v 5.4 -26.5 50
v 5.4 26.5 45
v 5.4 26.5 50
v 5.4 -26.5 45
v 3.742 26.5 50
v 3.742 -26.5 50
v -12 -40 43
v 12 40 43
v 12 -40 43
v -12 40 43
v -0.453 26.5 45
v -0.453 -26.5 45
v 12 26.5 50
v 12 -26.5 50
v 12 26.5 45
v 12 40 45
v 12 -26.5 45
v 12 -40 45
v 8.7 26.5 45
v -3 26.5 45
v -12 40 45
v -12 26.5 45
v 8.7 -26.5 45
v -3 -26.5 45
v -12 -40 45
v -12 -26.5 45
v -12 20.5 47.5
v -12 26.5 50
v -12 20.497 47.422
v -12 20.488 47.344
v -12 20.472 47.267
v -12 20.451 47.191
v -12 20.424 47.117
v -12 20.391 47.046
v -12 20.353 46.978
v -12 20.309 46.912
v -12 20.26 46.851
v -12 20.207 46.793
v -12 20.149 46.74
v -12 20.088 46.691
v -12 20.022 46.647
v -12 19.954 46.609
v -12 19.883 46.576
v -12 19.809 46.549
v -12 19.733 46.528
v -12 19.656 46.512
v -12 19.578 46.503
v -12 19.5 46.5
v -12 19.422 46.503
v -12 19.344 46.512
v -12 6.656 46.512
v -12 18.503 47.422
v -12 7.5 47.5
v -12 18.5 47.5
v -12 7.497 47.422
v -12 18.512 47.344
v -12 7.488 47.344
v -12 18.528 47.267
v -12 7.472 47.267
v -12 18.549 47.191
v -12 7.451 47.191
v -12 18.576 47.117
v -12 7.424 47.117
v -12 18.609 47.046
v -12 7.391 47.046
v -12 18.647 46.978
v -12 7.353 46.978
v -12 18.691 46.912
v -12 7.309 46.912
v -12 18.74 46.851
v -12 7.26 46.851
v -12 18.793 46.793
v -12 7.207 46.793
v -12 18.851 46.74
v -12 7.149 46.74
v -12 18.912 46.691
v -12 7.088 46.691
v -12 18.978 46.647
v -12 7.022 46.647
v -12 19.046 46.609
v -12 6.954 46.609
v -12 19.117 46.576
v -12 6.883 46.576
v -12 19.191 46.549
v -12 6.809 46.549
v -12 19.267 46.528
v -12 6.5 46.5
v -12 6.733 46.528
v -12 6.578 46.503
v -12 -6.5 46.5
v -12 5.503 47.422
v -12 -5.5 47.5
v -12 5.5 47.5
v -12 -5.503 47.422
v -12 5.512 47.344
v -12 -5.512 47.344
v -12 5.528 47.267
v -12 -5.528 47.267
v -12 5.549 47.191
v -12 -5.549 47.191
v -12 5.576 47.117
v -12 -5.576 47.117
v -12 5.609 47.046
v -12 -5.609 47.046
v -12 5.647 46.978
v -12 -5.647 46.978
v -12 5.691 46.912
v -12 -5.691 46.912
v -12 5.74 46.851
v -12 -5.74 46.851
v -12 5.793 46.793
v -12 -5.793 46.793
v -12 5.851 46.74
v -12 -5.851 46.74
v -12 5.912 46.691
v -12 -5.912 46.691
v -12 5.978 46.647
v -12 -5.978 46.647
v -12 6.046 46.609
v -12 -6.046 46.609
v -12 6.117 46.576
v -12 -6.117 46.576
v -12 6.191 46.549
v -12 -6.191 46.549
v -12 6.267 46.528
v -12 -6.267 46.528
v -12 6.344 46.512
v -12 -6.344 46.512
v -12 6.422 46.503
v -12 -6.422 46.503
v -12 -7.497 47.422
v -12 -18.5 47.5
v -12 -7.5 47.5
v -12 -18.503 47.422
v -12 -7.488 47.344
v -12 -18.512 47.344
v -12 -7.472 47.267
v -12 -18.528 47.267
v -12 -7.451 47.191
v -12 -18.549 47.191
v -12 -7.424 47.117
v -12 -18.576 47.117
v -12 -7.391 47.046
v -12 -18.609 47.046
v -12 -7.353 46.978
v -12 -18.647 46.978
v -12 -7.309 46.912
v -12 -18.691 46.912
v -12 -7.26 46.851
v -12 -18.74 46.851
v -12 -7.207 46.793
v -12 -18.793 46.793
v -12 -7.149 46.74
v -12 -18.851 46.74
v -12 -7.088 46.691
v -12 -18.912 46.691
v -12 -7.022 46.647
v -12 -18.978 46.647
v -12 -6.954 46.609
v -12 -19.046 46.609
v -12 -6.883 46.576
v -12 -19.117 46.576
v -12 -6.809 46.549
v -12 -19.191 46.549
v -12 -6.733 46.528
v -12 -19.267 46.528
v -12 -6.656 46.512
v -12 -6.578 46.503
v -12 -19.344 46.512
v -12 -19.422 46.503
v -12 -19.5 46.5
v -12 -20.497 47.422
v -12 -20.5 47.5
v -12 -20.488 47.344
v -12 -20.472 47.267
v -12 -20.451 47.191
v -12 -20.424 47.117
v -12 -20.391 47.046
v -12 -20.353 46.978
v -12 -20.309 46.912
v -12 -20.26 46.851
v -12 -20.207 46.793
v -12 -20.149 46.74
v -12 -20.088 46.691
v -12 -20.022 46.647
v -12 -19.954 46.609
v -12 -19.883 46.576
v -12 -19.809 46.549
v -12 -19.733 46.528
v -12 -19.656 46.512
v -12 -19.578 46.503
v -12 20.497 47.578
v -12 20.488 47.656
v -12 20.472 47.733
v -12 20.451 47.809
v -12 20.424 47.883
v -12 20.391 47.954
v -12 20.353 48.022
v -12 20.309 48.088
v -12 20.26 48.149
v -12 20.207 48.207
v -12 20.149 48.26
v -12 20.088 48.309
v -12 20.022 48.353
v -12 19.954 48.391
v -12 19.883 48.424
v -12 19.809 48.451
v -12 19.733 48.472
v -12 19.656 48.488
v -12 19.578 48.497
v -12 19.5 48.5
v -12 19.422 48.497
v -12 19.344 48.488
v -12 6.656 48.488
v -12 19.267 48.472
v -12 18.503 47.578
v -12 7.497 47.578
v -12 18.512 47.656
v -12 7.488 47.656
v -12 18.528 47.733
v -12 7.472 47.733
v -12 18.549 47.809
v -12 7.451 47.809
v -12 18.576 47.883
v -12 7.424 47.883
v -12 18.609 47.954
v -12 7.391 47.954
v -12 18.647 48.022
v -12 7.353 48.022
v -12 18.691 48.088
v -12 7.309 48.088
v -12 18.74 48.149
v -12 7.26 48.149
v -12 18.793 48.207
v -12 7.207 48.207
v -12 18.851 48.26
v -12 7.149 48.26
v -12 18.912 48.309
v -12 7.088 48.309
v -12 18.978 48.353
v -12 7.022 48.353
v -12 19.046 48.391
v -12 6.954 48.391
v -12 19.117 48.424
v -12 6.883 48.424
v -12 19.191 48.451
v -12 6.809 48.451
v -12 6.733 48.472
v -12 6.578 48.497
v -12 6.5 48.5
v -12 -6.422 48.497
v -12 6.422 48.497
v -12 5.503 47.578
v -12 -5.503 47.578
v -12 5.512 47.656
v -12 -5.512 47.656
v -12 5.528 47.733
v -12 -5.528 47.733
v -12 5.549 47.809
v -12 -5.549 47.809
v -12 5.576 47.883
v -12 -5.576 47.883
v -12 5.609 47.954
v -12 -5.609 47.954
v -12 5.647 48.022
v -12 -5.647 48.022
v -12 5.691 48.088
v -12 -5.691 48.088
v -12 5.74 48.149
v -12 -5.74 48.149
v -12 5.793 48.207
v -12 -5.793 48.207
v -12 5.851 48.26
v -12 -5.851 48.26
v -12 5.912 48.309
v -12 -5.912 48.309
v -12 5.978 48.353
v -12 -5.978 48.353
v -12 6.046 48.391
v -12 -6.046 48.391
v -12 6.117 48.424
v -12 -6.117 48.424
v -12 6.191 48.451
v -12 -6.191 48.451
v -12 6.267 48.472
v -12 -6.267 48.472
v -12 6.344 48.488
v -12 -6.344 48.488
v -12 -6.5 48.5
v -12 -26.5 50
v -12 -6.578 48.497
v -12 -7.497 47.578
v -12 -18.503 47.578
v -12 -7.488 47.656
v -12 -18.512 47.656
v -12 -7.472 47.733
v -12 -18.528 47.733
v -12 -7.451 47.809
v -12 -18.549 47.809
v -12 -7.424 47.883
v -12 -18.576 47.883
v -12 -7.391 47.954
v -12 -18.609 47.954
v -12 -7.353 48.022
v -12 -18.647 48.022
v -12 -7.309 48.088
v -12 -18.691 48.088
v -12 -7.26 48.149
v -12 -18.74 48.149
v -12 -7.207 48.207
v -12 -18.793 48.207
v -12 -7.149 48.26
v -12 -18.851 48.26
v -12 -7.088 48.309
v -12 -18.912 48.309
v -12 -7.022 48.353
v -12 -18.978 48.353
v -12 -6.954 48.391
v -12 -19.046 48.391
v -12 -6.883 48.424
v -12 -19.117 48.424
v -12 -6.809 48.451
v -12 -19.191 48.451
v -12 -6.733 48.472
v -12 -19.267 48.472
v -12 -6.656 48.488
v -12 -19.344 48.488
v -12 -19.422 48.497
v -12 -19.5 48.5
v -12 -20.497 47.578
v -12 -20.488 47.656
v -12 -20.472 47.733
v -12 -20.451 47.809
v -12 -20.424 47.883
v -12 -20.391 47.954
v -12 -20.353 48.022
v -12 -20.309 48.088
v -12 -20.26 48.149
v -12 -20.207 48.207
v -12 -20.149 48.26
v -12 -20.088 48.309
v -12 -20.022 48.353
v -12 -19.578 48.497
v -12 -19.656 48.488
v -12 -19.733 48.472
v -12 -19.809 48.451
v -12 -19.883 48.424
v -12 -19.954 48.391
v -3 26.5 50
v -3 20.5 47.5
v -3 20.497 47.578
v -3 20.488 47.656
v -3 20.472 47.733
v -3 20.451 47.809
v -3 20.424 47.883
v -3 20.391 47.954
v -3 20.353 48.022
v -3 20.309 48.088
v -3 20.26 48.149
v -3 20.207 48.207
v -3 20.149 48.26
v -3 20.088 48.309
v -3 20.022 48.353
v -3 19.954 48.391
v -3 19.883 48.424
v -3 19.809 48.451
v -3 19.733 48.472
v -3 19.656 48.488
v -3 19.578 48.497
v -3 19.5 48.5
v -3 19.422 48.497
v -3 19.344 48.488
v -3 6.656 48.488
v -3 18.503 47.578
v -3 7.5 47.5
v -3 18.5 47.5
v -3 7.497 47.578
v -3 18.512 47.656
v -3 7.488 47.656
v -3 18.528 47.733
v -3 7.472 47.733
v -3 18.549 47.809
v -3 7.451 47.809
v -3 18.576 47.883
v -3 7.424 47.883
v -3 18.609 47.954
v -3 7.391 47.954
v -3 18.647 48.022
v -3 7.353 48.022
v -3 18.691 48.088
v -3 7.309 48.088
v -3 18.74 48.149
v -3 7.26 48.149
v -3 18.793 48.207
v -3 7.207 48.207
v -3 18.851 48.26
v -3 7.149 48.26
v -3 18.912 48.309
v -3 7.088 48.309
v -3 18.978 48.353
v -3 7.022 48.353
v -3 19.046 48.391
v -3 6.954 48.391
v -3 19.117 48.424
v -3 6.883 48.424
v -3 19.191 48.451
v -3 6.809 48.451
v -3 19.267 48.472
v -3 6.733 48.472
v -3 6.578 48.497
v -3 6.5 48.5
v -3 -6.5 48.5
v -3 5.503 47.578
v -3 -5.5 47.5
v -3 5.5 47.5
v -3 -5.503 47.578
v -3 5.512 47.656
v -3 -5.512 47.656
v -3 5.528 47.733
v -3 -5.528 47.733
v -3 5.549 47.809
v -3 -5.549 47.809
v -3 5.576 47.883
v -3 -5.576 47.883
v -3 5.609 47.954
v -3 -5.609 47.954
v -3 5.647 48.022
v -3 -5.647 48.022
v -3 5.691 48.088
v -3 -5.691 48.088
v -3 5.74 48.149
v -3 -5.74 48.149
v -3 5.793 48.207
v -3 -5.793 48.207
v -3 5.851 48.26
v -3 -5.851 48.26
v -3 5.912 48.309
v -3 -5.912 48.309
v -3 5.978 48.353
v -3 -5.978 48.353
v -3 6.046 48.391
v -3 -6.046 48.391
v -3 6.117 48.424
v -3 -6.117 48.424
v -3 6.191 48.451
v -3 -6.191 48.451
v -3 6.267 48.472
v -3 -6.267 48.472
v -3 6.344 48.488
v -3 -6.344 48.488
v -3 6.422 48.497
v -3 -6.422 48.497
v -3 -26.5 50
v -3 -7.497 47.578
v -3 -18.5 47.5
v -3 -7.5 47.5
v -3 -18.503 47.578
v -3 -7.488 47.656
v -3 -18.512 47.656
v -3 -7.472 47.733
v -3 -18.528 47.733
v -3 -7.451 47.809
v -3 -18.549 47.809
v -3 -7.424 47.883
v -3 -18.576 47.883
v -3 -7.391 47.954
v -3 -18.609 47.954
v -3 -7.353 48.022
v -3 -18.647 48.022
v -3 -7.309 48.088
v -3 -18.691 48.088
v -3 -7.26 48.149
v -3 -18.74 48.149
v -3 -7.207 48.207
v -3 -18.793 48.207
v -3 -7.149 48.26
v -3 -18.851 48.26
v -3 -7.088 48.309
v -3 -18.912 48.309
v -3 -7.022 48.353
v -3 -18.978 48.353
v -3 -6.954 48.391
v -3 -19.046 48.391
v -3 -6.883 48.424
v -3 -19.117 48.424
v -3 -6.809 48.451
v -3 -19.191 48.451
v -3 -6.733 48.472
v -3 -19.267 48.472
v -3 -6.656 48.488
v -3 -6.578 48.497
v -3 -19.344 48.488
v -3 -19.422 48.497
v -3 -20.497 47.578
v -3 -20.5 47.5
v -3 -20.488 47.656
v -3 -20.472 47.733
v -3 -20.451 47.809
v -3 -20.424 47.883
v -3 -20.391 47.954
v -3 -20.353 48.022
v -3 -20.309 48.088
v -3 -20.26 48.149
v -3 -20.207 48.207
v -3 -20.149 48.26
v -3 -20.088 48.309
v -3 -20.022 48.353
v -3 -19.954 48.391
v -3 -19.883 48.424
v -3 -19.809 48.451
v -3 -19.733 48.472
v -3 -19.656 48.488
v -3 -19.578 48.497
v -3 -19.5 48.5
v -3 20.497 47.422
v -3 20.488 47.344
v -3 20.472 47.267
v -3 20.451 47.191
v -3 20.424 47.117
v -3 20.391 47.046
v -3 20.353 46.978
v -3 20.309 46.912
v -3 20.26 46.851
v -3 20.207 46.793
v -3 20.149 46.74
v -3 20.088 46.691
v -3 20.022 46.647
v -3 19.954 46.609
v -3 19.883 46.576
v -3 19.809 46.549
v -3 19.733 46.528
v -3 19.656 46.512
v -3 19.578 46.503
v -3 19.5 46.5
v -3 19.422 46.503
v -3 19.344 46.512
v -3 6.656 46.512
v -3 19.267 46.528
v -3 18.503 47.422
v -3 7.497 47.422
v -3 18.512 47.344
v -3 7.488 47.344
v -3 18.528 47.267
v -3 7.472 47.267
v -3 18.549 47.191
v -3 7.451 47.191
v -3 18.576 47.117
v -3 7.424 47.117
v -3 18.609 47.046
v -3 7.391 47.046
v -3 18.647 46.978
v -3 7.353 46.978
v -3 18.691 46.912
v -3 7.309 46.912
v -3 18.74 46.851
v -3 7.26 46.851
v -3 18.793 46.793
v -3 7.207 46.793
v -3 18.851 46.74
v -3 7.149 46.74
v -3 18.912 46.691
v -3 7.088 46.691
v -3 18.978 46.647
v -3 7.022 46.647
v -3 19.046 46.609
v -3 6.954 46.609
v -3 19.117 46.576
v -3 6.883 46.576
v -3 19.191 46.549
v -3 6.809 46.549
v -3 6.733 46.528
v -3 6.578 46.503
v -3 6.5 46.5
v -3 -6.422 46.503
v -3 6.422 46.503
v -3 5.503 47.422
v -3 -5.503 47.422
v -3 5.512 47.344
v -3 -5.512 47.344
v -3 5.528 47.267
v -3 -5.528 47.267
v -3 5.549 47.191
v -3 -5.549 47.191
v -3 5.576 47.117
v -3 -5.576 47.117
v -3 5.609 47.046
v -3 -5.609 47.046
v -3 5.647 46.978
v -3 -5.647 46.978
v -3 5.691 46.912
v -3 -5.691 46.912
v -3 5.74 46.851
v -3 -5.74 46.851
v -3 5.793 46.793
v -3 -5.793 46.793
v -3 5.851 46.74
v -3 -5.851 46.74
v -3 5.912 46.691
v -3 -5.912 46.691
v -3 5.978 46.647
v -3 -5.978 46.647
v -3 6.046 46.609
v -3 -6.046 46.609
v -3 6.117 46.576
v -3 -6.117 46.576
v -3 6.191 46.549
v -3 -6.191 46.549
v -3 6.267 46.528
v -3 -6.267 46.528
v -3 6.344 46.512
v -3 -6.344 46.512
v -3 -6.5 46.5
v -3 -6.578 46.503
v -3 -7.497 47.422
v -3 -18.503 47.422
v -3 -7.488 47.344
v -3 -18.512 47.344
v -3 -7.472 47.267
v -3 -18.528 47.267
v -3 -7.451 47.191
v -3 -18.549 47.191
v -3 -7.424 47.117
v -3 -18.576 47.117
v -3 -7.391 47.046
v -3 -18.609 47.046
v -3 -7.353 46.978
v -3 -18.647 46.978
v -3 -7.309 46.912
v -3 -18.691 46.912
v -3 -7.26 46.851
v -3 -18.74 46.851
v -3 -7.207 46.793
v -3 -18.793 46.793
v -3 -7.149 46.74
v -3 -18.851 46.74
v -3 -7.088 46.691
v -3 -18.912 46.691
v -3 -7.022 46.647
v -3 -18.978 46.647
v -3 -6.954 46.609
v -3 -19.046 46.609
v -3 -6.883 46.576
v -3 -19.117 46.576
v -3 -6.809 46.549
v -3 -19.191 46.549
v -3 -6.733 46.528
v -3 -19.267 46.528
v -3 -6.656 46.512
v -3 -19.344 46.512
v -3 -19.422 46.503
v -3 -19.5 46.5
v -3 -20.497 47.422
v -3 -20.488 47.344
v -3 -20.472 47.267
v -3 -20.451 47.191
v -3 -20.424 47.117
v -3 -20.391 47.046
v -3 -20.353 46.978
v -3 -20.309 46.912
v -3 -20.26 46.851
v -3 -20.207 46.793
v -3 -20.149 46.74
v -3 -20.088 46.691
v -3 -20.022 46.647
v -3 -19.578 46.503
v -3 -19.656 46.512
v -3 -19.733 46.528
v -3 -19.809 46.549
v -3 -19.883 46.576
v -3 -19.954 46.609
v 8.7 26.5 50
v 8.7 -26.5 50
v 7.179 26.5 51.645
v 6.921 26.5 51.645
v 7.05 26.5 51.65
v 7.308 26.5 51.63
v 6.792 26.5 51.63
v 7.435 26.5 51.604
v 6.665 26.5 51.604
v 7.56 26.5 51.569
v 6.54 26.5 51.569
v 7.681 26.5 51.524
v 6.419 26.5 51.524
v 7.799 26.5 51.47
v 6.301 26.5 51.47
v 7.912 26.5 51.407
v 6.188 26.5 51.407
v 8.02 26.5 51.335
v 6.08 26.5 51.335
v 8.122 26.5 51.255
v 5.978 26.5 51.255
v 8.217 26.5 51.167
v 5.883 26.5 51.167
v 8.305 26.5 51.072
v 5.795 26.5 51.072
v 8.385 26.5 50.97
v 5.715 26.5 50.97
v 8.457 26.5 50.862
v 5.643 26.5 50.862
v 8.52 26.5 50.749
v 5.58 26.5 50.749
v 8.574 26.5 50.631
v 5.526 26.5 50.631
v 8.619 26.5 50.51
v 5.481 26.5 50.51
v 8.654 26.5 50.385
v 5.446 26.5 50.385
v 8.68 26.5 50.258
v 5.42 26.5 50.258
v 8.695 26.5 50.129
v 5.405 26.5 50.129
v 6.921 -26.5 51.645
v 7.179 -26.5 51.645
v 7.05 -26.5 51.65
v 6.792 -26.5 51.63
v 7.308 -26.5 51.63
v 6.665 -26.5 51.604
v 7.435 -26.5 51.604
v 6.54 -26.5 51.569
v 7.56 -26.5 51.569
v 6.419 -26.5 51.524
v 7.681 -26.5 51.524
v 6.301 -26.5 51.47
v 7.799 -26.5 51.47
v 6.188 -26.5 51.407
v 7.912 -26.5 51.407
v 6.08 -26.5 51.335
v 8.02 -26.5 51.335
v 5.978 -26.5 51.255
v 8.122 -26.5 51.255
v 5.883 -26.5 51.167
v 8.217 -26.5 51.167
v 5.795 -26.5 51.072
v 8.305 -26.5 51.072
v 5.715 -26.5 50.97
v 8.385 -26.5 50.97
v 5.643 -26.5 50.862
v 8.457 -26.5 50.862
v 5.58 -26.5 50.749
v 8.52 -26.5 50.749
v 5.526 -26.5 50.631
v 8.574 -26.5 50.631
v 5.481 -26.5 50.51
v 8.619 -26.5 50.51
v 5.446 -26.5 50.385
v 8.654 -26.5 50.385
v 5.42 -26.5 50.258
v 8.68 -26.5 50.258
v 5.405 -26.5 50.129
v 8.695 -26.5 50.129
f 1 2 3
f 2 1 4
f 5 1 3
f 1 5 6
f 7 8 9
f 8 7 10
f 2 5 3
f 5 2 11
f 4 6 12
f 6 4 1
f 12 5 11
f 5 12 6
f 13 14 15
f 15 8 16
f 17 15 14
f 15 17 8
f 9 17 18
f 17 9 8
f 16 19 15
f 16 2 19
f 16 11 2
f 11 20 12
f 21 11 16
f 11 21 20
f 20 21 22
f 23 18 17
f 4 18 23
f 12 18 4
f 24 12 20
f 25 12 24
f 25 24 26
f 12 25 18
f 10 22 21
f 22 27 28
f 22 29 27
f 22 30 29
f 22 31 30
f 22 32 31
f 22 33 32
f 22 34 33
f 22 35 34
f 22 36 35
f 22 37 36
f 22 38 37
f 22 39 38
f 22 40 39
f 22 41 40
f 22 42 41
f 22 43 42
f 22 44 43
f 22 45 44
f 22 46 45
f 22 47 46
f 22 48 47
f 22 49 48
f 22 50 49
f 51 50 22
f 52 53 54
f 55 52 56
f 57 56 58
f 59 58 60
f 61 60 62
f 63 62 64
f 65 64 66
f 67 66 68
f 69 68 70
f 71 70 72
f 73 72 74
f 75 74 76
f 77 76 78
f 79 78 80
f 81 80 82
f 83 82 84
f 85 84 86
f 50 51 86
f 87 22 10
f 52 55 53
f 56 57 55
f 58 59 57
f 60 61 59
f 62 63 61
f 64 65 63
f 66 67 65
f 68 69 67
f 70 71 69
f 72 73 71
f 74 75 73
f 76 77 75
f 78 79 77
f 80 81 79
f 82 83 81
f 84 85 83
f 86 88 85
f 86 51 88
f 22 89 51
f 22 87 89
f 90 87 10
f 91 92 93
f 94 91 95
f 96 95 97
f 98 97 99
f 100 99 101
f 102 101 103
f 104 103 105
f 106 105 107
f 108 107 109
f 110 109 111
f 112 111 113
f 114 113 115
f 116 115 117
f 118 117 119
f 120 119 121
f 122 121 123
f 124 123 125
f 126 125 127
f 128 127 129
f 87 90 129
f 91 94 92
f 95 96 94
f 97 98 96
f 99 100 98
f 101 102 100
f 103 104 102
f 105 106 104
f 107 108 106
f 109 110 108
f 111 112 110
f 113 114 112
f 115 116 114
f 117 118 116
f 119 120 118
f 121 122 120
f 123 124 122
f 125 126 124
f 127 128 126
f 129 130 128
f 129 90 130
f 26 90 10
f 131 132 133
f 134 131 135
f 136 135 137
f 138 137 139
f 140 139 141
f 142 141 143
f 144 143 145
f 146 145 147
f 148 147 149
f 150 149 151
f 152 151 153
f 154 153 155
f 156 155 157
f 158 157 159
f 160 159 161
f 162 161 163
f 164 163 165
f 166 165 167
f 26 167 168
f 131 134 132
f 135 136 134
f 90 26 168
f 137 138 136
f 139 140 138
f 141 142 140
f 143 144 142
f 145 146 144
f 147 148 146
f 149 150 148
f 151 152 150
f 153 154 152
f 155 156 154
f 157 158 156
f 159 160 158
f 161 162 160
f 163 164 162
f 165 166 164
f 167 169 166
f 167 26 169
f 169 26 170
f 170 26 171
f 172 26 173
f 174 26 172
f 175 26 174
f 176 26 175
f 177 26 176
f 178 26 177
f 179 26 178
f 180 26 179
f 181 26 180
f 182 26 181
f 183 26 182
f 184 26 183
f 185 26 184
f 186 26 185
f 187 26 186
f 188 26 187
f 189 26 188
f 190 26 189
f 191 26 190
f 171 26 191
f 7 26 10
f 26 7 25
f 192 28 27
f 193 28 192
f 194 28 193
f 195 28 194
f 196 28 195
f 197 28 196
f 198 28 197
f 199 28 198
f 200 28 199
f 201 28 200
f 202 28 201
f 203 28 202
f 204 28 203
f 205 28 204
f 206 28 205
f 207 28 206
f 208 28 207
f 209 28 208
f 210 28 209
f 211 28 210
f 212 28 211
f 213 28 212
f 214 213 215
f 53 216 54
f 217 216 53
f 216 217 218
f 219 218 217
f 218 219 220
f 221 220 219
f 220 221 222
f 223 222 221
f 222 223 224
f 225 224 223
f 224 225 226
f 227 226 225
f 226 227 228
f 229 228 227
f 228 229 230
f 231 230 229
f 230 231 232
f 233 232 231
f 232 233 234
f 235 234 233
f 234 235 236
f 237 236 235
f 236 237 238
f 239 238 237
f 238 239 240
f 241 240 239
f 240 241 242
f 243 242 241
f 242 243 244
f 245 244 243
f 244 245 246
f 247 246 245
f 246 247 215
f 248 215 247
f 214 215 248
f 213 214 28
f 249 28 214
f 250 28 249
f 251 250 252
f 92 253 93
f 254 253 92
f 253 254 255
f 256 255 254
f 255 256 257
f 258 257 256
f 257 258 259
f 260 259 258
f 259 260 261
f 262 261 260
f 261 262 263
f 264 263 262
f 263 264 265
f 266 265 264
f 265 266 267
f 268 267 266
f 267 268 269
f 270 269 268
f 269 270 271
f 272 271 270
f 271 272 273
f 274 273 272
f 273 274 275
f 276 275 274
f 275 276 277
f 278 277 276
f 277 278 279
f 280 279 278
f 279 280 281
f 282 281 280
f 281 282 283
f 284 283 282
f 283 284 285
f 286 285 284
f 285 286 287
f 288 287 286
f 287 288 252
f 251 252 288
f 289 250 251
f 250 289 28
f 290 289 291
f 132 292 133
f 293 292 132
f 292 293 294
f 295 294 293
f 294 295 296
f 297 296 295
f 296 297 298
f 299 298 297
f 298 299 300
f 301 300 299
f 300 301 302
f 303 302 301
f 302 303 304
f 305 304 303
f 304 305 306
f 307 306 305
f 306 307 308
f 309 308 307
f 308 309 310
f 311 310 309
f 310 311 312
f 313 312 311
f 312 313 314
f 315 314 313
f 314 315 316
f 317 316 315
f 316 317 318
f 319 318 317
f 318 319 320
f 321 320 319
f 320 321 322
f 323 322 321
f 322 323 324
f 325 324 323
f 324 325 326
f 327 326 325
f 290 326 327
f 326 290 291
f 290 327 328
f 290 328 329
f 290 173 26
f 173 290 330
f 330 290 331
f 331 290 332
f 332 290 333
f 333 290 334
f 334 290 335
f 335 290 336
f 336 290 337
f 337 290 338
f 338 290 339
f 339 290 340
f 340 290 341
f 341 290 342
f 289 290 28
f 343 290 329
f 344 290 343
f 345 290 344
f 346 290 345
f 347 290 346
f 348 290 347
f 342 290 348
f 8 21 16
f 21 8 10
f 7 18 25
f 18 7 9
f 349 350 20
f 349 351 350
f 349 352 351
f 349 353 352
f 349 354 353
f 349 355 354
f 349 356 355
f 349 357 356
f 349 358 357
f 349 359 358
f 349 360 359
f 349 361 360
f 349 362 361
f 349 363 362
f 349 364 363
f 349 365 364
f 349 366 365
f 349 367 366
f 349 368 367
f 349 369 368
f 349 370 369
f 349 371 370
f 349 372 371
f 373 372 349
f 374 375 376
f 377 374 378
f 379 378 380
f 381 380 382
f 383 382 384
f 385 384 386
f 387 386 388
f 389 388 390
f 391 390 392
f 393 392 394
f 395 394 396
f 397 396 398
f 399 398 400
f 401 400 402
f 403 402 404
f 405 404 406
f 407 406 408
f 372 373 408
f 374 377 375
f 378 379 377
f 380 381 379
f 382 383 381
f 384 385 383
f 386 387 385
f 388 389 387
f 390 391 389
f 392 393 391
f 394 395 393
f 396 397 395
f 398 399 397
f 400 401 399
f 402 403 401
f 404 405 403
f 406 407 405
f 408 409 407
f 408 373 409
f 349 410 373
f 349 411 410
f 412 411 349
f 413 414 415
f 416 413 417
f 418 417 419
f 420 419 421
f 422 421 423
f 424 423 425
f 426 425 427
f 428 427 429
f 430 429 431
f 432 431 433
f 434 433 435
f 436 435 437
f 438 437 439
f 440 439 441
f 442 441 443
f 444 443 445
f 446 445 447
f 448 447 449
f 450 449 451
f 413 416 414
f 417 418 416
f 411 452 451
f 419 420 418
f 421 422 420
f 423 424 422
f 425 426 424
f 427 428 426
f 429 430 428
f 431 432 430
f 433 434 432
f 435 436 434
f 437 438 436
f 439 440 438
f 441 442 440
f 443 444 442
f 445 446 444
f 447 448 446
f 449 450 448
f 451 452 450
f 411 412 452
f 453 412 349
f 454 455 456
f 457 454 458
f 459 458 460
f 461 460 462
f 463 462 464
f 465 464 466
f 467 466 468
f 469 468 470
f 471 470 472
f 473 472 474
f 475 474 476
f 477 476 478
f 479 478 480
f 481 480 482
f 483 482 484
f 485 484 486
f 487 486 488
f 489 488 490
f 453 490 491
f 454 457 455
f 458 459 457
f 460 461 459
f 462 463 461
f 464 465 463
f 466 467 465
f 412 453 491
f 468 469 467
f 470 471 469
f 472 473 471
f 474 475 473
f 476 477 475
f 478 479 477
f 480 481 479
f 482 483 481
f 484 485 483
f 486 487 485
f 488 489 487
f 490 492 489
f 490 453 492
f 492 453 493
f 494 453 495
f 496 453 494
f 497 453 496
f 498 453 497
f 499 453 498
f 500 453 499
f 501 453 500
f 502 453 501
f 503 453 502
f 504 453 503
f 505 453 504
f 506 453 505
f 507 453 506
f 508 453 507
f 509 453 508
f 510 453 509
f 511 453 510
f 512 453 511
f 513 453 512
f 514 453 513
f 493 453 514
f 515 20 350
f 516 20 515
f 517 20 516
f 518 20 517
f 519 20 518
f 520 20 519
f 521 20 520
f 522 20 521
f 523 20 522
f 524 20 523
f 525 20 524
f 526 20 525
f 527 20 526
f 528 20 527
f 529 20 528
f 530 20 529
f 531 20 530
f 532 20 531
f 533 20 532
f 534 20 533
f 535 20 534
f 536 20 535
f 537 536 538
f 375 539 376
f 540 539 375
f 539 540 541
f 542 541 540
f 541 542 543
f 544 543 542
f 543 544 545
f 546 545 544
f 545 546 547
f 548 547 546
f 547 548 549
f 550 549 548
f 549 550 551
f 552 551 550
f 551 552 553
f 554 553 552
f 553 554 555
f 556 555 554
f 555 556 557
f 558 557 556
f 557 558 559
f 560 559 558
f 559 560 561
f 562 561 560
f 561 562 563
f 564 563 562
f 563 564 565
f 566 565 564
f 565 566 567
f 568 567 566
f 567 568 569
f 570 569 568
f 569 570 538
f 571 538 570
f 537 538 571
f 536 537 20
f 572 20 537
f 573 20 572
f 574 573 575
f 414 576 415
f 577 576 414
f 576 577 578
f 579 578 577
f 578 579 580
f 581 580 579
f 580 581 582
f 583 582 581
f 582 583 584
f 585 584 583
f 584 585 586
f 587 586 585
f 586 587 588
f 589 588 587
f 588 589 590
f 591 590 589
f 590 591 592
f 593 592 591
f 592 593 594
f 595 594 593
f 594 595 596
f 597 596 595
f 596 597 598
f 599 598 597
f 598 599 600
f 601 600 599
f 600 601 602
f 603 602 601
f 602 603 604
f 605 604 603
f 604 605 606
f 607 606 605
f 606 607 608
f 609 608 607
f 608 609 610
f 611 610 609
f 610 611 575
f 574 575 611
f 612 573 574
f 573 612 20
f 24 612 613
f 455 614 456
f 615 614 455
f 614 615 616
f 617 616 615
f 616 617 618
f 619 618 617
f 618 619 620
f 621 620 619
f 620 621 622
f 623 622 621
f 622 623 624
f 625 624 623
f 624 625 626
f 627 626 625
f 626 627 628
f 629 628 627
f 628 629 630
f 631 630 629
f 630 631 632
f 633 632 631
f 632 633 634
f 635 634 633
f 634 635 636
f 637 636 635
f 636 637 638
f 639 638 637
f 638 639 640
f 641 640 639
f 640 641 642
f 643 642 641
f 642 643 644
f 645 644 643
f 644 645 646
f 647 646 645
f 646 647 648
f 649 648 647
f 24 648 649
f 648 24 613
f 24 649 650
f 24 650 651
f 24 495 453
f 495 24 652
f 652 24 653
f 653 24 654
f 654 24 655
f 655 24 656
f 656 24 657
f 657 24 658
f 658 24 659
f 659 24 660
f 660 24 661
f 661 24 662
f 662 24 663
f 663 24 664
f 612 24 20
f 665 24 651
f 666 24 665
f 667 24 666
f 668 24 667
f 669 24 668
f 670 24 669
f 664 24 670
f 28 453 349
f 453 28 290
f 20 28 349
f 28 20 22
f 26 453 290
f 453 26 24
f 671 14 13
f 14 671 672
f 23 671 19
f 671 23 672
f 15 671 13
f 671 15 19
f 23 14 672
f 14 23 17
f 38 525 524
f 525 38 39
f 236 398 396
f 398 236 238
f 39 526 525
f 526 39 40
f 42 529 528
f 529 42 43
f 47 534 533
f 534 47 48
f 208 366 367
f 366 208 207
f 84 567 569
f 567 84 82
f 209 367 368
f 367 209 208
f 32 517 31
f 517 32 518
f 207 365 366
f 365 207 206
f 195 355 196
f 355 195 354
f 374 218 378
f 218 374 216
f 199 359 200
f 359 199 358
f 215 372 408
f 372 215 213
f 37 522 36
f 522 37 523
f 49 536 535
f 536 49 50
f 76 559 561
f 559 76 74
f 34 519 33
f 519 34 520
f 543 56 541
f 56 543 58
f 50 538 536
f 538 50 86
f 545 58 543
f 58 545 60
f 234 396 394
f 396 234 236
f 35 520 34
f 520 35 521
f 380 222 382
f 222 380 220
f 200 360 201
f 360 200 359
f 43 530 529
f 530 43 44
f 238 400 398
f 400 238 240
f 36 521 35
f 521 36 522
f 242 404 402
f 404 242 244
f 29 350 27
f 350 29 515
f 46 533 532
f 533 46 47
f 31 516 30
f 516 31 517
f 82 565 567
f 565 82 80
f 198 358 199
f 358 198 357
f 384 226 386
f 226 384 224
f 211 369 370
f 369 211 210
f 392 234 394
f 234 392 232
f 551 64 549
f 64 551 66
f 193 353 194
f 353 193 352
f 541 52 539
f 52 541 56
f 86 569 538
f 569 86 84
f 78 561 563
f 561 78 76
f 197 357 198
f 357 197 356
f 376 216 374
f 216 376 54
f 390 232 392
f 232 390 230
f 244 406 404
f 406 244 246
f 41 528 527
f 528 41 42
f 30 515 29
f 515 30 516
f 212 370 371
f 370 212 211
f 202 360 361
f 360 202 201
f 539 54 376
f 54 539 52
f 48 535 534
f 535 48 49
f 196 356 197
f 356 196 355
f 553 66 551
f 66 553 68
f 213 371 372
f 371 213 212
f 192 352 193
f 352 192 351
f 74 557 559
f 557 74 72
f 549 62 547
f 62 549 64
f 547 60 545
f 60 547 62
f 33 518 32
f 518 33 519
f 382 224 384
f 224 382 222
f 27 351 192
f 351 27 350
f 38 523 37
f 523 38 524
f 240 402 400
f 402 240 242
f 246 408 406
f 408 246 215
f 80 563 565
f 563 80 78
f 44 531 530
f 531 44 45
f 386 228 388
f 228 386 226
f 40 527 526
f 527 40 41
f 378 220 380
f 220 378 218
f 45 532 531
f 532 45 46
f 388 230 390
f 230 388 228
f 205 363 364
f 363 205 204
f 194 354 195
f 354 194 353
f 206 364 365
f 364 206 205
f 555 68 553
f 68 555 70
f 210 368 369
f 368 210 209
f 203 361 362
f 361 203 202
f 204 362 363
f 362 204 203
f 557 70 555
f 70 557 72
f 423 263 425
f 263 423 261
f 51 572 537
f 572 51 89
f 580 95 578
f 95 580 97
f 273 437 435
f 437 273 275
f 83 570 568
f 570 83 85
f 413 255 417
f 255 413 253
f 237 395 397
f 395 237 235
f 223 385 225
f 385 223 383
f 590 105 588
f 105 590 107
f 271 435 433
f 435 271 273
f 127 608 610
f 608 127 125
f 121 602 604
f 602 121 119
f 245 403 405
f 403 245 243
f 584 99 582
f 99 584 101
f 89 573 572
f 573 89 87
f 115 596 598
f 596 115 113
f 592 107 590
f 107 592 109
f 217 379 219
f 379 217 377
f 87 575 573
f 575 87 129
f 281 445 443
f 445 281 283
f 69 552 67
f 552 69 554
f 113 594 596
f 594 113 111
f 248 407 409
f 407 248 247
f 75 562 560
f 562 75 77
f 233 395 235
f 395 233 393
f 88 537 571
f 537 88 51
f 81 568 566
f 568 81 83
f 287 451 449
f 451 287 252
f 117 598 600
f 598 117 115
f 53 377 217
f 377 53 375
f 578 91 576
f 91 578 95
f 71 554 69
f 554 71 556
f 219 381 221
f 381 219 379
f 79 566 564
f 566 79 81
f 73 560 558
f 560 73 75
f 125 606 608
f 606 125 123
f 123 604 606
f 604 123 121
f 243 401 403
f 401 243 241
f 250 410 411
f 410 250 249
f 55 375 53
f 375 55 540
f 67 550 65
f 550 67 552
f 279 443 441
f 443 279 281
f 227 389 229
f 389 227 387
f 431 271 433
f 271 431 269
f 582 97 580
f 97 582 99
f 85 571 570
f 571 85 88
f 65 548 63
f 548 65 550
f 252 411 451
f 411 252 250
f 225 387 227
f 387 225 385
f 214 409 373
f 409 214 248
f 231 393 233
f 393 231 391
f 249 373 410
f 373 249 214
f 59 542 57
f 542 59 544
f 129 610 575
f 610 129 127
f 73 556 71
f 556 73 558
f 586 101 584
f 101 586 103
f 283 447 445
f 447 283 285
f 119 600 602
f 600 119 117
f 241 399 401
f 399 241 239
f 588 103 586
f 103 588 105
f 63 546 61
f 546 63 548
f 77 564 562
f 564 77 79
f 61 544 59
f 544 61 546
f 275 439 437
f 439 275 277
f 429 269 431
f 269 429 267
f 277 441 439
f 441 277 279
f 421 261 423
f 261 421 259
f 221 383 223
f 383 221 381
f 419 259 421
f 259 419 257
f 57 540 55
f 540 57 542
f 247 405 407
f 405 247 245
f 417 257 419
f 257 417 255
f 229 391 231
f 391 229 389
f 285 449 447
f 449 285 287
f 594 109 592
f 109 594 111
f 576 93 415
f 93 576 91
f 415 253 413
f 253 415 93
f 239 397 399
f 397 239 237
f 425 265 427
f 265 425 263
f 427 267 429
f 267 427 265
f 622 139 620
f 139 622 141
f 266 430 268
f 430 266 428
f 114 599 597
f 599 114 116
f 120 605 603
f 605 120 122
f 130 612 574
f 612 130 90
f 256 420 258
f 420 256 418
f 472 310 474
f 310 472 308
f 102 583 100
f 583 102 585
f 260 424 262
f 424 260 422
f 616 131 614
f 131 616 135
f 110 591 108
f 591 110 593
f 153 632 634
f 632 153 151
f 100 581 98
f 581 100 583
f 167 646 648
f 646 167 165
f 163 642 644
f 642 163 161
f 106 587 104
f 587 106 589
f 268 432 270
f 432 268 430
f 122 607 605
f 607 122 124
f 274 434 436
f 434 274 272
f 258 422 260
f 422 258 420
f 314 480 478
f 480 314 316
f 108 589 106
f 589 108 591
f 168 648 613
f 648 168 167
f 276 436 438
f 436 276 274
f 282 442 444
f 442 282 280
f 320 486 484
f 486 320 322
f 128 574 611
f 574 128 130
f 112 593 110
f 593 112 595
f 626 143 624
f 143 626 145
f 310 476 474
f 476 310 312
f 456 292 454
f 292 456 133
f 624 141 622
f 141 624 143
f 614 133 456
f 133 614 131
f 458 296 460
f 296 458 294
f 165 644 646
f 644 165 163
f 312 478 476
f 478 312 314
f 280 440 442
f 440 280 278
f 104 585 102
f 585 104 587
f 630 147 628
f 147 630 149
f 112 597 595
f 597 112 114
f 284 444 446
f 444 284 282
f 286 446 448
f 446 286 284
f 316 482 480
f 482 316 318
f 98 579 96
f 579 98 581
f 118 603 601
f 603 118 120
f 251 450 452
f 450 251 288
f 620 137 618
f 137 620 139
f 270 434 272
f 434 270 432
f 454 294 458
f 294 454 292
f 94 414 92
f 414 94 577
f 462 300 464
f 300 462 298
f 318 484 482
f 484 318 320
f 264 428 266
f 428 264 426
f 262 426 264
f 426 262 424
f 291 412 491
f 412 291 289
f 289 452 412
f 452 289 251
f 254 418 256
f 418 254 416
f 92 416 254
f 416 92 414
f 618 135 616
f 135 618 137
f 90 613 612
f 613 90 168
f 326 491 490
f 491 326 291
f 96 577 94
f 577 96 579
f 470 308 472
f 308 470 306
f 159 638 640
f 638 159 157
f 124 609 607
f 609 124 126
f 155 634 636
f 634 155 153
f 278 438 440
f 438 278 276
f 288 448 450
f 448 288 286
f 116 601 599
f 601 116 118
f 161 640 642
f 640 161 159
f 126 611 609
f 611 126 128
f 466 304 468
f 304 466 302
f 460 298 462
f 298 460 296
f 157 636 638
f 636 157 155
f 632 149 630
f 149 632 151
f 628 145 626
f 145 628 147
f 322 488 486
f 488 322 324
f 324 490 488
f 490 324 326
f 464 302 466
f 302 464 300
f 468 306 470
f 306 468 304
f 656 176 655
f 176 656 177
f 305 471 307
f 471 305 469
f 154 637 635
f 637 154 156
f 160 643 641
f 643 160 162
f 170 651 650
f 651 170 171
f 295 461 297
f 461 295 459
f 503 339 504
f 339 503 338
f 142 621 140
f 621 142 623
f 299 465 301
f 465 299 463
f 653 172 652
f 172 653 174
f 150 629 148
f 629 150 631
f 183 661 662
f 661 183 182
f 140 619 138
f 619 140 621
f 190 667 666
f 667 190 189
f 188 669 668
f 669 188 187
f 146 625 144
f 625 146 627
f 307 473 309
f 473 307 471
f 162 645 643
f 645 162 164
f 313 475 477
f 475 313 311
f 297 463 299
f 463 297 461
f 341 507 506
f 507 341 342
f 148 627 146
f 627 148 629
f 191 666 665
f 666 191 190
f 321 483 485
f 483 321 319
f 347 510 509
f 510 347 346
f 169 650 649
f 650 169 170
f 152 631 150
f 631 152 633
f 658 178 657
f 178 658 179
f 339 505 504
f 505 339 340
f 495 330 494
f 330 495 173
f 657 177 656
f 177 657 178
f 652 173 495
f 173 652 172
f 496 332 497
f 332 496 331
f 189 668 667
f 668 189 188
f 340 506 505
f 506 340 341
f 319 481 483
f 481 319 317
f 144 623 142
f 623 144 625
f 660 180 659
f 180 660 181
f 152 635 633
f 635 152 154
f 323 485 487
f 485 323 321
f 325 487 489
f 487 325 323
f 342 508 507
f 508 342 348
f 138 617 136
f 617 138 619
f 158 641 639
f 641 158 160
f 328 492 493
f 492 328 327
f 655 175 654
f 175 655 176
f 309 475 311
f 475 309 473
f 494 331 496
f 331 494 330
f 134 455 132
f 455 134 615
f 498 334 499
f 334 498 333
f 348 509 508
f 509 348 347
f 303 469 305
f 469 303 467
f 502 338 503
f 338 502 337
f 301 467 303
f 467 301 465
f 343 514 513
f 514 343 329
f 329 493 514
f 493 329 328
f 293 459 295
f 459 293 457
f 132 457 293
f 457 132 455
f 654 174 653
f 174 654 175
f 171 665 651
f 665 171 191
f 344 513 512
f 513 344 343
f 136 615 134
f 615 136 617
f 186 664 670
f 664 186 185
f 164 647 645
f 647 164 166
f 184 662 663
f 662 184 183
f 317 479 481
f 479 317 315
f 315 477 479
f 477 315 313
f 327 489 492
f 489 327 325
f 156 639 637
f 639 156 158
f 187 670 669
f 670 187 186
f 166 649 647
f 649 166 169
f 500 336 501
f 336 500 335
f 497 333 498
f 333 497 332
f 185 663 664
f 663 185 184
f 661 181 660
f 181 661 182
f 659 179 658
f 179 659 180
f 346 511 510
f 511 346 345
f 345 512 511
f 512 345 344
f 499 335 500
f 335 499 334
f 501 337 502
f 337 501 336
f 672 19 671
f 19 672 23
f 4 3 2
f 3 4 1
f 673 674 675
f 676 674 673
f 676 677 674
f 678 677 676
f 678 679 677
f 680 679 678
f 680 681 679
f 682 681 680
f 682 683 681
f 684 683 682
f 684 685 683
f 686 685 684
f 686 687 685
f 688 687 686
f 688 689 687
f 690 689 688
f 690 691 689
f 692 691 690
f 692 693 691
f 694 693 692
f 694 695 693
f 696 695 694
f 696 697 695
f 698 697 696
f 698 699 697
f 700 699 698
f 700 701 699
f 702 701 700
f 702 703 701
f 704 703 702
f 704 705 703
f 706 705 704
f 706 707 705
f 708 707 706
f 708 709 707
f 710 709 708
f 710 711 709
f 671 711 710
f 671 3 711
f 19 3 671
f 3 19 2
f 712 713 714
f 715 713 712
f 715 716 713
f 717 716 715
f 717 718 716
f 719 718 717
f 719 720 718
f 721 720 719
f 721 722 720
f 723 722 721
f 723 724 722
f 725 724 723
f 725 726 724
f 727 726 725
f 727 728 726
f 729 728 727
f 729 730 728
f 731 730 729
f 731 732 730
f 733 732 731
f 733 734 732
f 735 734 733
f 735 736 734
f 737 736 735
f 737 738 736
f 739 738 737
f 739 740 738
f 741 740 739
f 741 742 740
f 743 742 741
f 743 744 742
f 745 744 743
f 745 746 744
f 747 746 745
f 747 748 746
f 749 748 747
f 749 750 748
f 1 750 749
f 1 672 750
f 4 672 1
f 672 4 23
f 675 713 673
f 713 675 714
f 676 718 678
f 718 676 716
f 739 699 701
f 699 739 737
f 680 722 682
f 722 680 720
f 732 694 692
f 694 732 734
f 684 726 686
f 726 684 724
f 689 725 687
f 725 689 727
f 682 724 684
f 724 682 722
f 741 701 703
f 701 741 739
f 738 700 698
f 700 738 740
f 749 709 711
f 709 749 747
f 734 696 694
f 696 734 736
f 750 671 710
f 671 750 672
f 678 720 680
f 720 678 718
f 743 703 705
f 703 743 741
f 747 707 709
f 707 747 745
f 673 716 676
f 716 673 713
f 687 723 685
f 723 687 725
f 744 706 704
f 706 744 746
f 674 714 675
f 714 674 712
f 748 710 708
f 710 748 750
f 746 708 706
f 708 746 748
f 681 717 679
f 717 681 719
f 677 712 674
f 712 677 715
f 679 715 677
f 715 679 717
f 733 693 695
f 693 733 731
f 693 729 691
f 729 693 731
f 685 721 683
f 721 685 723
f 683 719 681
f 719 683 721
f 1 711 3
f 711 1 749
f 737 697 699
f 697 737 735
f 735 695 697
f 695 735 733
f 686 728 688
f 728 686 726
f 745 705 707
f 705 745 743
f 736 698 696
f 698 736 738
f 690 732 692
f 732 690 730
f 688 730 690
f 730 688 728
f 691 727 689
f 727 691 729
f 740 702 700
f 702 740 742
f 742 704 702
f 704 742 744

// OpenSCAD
//// VARIABLES ////
body_height = 40;
large_radius = 65;
small_radius = 45;
circle_offset = 20;
back_thickness = 3;
front_thickness = back_thickness;
hole_radius = 26.5;
small_offset = 130;
hole_offset = small_offset - 35;
saddle_base_width = 24;
saddle_base_length = 80;
saddle_base_height = 2;
neck_bottom_radius = 21.35;
neck_top_radius = 17.45;
neck_length = 150;
neck_quality = 80;
body_quality = neck_quality;

head_width = neck_top_radius * 2 + 10;
head_length = small_radius * 1.4;
head_thickness = 11.5;
head_angle = 15;
head_rad = (head_width - neck_top_radius) / 4;
head_rad_big = 55;

nut_thickness = 2;
nut_height = 2;

string_rad=1;
body_length = 100;

saddle_top_height = 7;
saddle_top_width = 53;
saddle_increment = (saddle_top_width - 14) / 2;
string_block_length = 9;

bridge_thickness = 3.3;

module body() {
 back();
 front();

 difference() {
  sides();
  half_neck_base();
 }
}

module uke_shape(thickness) {
 hull() {
  translate([0,-1*circle_offset,0]) cylinder(r=large_radius, h=thickness, $fn=body_quality);
  translate([0,circle_offset,0]) cylinder(r=large_radius, h=thickness, $fn=body_quality);
 }

 hull() {
  translate([small_offset,-1*circle_offset,0]) cylinder(r=small_radius, h=thickness, $fn=body_quality);
  translate([small_offset,circle_offset,0]) cylinder(r=small_radius, h=thickness, $fn=body_quality);
 }

 difference() {
  translate([30,-70,0]) cube(size=[85,140,thickness]);
  translate([82.8,112.7,-1]) cylinder(r=60, h=thickness + 2, $fn=body_quality);
  translate([82.8,-112.7,-1]) cylinder(r=60, h=thickness + 2, $fn=body_quality);
 }
}

module back() {
 uke_shape(back_thickness);
}

module front() {
 difference() {
  translate([0,0,body_height])
   uke_shape(front_thickness);
  translate([hole_offset,0,body_height-1])
   cylinder(r=hole_radius, h=front_thickness+2, $fn=body_quality);
 }
 saddle();
}

module bridge() {
 bridge_height = saddle_top_height - saddle_base_height;
 translate([saddle_base_width / -2, saddle_top_width / -2, body_height + front_thickness + saddle_base_height]) {
  /*
  color("blue")
    translate([saddle_base_width - bridge_thickness, 0, 0])
     cube(size=[bridge_thickness, saddle_top_width, saddle_top_height]);

   color("blue")
    translate([saddle_base_width - bridge_thickness * 3 - 5, 0, 0])
     cube(size=[bridge_thickness + 5, saddle_top_width, saddle_top_height]);
   */
   color("red")
    translate([saddle_base_width - bridge_thickness * 2,0,0]) {
     cube(size=[bridge_thickness, saddle_top_width, bridge_height]);
     translate([bridge_thickness/2,0,bridge_height]) rotate([-90,0,0]) cylinder(r=bridge_thickness/2, h=saddle_top_width, $fn=body_quality);
    }
 }
}

module saddle() {
 translate([saddle_base_width / -2, 0, body_height + front_thickness]) {
  difference() {
   union() {
    color("green") {
     translate([0, saddle_base_length / -2, 0])
      cube(size=[saddle_base_width, saddle_base_length, saddle_base_height]);
    }
    translate([0, saddle_top_width / -2, 0])
     cube(size=[string_block_length, saddle_top_width, saddle_top_height]);
    translate([saddle_base_width - bridge_thickness, saddle_top_width / -2, 0])
     cube(size=[bridge_thickness, saddle_top_width, saddle_top_height]);

    difference() {
     translate([saddle_base_width - bridge_thickness * 3 - 5, saddle_top_width / -2, 0])
      cube(size=[bridge_thickness + 5, saddle_top_width, saddle_top_height]);
     // TODO: parameterize this
     translate([-3, saddle_top_width / -2 - 1, 8])
      rotate([0, 40, 0])
       cube(size=[15, 55, 15]);
    }
   }

   translate([-1, 0, (saddle_top_height - saddle_base_height) / 2 + saddle_base_height]) {
    string_hole(saddle_increment);
    string_hole(saddle_increment/3);
    string_hole(-saddle_increment/3);
    string_hole(-saddle_increment);
   }
  }
 }
}

module string_hole(increment) {
 translate([0,increment,0])
  rotate([0, 90, 0])
   #cylinder(r=string_rad, h=string_block_length + 2, $fn=body_quality);
}

module sides() {
 difference() {
  uke_shape(body_height);
  translate([4,0,-10])
   scale([0.94,0.87,1.5])
    uke_shape(body_height);
 }
}

module head() {
 angle_distance = 3;
 translate([neck_length + small_offset + small_radius - angle_distance, head_width * -0.5, body_height + front_thickness - head_thickness]) {
  rotate([0,head_angle,0]) {
   difference() {
    cube(size=[head_length, head_width, head_thickness]);
    translate([0,0,-1]) {
     cylinder(r1=head_rad*2, r2=head_rad, h=head_thickness + 2, $fn=neck_quality);
     translate([0,head_width,0]) cylinder(r1=head_rad*2, r2=head_rad, h=head_thickness + 2, $fn=neck_quality);
     translate([head_length + head_rad_big - 4,head_width/2,0]) cylinder(r=head_rad_big, h=head_thickness + 2, $fn=neck_quality);
    }
   }
  }
 }
}

module neck() {
 rotate([0,90,0])
  translate([-2*neck_bottom_radius - front_thickness + 1,0,small_offset + small_radius])
   difference() {
    cylinder(r1=neck_bottom_radius, r2=neck_top_radius, h=neck_length, $fn=neck_quality);
    translate([-2*neck_bottom_radius, -1*neck_bottom_radius, -1]) cube(size=[neck_bottom_radius * 2, neck_bottom_radius * 2, neck_length + 2]);
   }

 translate([small_offset + small_radius, 0, 0]) cylinder(r2=neck_bottom_radius, r1=neck_bottom_radius * 0.3, h=body_height);
 nut();
 head();
}

module nut() {
 color("green") {
  translate([neck_length + small_offset + small_radius, neck_top_radius * -1, body_height + front_thickness]) {
   cube(size=[nut_thickness,neck_top_radius * 2,nut_height]);
   difference() {
    rotate([-90,0,0]) translate([0,nut_height * -1,0]) cylinder(r=nut_thickness, h=neck_top_radius * 2, $fn=neck_quality);
    translate([-nut_thickness, -1, 0]) cube(size=[nut_thickness,(neck_top_radius * 2) + 2,nut_height * 2]);
   }
  }
 }
}

module half_neck_base() {
 translate([small_offset + small_radius, 0, body_height/2]) cylinder(r2=neck_bottom_radius, r1=neck_bottom_radius * 0.65, h=body_height / 2);

}

/*
body();

//translate([-100,100,0])
difference() {
 neck();
 translate([0,0,-0.5*body_height]) sides();
}
*/

saddle();

bridge();
//bridge();
